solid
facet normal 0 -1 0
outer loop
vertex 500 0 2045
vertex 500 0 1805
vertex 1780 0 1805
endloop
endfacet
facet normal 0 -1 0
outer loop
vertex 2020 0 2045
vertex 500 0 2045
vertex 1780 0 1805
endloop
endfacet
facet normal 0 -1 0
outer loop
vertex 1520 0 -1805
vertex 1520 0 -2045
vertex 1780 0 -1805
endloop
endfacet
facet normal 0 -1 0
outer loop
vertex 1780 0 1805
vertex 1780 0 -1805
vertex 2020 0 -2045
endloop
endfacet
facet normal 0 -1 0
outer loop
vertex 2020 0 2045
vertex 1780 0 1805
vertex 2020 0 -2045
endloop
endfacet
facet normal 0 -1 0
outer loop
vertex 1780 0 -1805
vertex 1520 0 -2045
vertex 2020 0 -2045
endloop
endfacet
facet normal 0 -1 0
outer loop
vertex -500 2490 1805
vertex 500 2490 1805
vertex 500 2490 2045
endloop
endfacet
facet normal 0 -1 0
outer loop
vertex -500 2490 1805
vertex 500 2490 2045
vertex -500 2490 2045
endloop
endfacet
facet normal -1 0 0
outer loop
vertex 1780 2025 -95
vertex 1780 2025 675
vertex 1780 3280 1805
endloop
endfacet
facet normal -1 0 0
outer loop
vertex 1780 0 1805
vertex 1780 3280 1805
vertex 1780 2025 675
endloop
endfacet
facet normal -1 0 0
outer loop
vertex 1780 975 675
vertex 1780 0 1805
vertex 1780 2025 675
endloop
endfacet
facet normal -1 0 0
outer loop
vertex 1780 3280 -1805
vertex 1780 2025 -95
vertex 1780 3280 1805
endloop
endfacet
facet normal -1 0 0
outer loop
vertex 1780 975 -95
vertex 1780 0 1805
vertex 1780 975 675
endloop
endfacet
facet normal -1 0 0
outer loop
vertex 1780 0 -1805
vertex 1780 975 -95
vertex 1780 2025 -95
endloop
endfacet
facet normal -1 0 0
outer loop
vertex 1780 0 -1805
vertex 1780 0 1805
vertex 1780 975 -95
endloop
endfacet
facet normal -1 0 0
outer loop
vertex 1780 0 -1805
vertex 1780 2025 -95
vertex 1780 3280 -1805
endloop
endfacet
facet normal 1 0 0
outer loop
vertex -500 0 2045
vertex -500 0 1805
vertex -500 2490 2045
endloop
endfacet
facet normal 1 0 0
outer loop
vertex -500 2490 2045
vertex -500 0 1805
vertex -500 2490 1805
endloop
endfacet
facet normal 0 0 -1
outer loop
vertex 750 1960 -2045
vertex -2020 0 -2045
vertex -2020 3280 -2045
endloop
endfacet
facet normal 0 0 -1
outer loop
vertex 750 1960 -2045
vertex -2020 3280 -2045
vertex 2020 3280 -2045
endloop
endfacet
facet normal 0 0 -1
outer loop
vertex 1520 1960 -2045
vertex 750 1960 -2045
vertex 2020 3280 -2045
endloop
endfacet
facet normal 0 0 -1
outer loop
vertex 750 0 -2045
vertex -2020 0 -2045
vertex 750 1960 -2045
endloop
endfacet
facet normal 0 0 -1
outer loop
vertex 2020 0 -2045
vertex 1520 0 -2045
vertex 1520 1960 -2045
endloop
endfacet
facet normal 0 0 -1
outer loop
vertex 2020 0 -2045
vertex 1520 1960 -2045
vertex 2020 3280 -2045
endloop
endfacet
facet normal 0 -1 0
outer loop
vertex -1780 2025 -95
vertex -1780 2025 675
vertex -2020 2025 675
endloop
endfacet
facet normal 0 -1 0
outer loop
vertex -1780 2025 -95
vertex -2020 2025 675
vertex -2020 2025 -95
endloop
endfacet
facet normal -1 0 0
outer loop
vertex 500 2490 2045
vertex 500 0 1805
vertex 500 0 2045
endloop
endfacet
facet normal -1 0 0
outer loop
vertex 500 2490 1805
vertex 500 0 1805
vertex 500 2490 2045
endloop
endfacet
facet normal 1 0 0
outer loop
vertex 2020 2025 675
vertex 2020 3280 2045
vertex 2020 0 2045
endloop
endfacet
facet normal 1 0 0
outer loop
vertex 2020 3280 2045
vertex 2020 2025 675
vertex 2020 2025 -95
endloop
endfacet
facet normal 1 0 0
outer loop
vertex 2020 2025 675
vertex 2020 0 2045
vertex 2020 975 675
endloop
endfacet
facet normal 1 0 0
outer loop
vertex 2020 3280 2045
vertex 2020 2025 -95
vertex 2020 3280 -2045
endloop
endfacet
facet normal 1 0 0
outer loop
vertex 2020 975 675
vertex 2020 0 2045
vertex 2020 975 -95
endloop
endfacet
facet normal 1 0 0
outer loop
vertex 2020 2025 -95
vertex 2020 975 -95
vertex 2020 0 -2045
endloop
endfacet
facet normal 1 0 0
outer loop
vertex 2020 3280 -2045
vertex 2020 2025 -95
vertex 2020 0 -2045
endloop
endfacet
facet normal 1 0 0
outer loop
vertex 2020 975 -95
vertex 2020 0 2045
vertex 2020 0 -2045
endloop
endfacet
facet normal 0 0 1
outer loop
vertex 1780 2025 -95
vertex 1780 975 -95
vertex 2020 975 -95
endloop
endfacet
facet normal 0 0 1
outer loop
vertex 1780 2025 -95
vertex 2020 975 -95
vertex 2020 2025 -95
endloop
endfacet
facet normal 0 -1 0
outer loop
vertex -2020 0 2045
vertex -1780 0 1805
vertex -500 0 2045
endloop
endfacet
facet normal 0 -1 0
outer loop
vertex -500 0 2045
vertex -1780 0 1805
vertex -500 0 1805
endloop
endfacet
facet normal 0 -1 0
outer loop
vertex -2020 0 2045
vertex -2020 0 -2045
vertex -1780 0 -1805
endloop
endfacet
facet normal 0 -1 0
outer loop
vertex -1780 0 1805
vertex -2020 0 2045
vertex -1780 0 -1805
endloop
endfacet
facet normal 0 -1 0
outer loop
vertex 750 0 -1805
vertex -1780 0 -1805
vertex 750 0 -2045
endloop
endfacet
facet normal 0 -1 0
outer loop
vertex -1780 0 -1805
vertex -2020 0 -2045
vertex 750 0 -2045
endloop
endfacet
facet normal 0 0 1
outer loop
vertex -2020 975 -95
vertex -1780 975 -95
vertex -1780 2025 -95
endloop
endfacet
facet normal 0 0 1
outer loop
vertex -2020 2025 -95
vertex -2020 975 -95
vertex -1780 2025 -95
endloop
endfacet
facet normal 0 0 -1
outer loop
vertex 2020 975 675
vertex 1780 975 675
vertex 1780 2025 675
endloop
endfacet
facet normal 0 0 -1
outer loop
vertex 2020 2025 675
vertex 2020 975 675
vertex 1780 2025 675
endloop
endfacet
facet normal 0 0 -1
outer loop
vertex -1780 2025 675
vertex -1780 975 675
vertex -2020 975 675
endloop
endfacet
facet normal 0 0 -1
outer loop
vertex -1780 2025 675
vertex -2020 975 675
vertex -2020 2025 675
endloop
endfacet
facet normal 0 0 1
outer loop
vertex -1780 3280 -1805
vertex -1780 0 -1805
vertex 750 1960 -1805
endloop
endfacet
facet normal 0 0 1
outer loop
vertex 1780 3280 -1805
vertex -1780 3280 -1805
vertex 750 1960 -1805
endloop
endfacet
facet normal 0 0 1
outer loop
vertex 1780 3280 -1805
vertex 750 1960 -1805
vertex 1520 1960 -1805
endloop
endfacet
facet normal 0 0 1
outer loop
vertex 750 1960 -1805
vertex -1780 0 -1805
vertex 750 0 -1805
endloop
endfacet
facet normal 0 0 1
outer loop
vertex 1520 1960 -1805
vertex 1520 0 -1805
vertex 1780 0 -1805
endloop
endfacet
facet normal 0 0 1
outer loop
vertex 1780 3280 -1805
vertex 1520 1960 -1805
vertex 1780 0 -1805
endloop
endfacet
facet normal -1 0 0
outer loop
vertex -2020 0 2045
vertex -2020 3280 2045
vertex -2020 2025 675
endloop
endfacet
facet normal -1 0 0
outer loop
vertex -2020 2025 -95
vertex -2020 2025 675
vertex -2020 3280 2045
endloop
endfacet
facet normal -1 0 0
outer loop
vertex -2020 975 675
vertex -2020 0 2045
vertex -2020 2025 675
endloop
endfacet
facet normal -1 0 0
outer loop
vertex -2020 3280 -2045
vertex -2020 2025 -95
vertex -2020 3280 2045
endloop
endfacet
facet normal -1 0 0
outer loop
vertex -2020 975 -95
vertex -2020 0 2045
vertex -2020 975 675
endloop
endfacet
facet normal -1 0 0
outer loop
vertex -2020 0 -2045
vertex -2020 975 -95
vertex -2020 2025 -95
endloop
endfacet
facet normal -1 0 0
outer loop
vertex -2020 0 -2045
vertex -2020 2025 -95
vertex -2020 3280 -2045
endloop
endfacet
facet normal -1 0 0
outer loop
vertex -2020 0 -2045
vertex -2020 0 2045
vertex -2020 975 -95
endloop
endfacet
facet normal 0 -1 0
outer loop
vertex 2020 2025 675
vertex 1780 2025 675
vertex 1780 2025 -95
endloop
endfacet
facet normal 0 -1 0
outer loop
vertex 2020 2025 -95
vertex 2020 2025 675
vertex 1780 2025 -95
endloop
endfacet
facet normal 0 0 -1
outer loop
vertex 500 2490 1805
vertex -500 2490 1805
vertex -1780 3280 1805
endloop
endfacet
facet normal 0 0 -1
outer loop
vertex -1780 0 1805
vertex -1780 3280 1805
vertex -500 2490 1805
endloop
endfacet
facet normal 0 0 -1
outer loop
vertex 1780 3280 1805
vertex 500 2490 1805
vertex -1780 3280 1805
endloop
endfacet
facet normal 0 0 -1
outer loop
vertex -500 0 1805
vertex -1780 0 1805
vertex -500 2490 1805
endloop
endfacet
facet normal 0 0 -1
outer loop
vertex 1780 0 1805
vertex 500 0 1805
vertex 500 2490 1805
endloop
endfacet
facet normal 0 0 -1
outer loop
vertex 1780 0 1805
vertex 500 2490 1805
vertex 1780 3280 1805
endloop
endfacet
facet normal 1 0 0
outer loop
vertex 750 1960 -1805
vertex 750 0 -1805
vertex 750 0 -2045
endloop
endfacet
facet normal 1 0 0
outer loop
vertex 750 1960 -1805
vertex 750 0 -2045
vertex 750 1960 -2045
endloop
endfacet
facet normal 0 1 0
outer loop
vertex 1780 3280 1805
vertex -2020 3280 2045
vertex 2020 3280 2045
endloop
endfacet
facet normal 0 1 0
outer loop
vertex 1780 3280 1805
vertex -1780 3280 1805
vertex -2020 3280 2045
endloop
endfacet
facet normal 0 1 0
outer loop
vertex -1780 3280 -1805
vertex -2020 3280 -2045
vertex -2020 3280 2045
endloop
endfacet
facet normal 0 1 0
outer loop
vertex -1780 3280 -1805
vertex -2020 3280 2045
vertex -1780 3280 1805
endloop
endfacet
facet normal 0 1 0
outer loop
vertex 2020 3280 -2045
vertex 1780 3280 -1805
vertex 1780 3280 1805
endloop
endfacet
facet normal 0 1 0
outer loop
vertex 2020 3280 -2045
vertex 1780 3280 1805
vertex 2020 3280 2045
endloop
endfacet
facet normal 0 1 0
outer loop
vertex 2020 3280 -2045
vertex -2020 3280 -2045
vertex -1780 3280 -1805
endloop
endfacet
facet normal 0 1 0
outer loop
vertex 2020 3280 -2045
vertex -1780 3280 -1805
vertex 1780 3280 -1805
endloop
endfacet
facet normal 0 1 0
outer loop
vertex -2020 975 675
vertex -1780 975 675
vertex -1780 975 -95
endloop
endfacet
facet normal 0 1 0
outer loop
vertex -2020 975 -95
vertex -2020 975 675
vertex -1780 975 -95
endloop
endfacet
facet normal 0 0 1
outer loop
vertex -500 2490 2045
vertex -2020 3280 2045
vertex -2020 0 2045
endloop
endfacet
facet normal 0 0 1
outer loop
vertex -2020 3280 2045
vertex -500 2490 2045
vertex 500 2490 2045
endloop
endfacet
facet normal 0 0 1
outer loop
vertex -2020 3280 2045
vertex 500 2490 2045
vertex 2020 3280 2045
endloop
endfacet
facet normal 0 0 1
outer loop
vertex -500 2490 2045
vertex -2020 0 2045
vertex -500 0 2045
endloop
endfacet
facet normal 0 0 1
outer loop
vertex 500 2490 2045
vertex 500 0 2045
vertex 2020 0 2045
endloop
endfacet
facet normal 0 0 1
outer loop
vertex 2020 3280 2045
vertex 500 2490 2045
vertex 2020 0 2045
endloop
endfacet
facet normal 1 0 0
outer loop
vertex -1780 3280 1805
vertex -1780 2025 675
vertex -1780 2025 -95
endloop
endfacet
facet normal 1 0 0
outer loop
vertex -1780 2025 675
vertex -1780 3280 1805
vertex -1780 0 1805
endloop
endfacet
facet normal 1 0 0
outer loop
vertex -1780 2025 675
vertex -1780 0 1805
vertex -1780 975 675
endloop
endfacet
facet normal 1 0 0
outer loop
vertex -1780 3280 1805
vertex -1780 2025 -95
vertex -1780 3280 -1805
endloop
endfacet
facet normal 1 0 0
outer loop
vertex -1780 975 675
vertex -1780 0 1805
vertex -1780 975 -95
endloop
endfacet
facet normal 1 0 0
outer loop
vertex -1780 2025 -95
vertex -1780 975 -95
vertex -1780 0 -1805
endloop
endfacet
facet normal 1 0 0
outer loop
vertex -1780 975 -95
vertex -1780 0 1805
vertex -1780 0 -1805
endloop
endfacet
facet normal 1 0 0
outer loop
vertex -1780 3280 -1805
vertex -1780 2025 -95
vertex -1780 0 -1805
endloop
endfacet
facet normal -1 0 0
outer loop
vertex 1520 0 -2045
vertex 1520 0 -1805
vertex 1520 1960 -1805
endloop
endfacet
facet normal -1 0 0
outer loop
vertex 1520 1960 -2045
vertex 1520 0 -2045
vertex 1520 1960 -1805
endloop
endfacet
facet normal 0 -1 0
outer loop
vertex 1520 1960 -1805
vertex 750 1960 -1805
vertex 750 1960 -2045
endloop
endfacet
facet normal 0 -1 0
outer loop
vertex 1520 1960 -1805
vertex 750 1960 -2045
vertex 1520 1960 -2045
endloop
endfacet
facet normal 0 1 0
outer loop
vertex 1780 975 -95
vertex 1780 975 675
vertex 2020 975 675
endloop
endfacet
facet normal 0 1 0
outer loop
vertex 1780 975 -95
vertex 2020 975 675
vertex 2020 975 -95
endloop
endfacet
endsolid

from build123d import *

# Parameters (mm, degrees)
SKETCH_1_W                 = 4040
SKETCH_1_H                 = 4090
SKETCH_1_W_2               = 3560
SKETCH_1_H_2               = 3610
EXTRUDE_293_DEPTH          = 3280
SKETCH_3_W                 = 770
SKETCH_3_H                 = 1960
CUT_EXTRUDE_510_DEPTH      = 241
SKETCH_4_W                 = 1000
SKETCH_4_H                 = 2490
CUT_EXTRUDE_703_DEPTH      = 241
SKETCH_5_W                 = 770
SKETCH_5_H                 = 1050
CUT_EXTRUDE_922_DEPTH      = 3801
CUT_EXTRUDE_922_DEPTH_BACK = 241


with BuildPart() as part:
    # 草图1 → Extrude 293 (new body)
    with BuildSketch(Plane(origin=(0, 0, 0), x_dir=(1, 0, 0), z_dir=(0, 1, 0))):
        Rectangle(SKETCH_1_W, SKETCH_1_H)
        Rectangle(SKETCH_1_W_2, SKETCH_1_H_2, mode=Mode.SUBTRACT)
    extrude(amount=EXTRUDE_293_DEPTH)

    # 草图3 → Cut-Extrude 510 (cut, through all)
    with BuildSketch(Plane.XY.offset(-1805)):
        with Locations((1135, 980)):
            Rectangle(SKETCH_3_W, SKETCH_3_H)
    extrude(amount=-CUT_EXTRUDE_510_DEPTH, mode=Mode.SUBTRACT)

    # 草图4 → Cut-Extrude 703 (cut, through all)
    with BuildSketch(Plane(origin=(0, 0, 1805), x_dir=(-1, 0, 0), z_dir=(0, 0, -1))):
        with Locations((0, 1245)):
            Rectangle(SKETCH_4_W, SKETCH_4_H)
    extrude(amount=-CUT_EXTRUDE_703_DEPTH, mode=Mode.SUBTRACT)

    # 草图5 → Cut-Extrude 922 (cut, two sides)
    with BuildSketch(Plane(origin=(-1780, 0, 0), x_dir=(0, 0, -1), z_dir=(1, 0, 0))) as cut_extrude_922_sk:
        with Locations((-290, 1500)):
            Rectangle(SKETCH_5_W, SKETCH_5_H)
    extrude(amount=CUT_EXTRUDE_922_DEPTH, mode=Mode.SUBTRACT)
    extrude(cut_extrude_922_sk.sketch, amount=-CUT_EXTRUDE_922_DEPTH_BACK, mode=Mode.SUBTRACT)


solid = part.part
